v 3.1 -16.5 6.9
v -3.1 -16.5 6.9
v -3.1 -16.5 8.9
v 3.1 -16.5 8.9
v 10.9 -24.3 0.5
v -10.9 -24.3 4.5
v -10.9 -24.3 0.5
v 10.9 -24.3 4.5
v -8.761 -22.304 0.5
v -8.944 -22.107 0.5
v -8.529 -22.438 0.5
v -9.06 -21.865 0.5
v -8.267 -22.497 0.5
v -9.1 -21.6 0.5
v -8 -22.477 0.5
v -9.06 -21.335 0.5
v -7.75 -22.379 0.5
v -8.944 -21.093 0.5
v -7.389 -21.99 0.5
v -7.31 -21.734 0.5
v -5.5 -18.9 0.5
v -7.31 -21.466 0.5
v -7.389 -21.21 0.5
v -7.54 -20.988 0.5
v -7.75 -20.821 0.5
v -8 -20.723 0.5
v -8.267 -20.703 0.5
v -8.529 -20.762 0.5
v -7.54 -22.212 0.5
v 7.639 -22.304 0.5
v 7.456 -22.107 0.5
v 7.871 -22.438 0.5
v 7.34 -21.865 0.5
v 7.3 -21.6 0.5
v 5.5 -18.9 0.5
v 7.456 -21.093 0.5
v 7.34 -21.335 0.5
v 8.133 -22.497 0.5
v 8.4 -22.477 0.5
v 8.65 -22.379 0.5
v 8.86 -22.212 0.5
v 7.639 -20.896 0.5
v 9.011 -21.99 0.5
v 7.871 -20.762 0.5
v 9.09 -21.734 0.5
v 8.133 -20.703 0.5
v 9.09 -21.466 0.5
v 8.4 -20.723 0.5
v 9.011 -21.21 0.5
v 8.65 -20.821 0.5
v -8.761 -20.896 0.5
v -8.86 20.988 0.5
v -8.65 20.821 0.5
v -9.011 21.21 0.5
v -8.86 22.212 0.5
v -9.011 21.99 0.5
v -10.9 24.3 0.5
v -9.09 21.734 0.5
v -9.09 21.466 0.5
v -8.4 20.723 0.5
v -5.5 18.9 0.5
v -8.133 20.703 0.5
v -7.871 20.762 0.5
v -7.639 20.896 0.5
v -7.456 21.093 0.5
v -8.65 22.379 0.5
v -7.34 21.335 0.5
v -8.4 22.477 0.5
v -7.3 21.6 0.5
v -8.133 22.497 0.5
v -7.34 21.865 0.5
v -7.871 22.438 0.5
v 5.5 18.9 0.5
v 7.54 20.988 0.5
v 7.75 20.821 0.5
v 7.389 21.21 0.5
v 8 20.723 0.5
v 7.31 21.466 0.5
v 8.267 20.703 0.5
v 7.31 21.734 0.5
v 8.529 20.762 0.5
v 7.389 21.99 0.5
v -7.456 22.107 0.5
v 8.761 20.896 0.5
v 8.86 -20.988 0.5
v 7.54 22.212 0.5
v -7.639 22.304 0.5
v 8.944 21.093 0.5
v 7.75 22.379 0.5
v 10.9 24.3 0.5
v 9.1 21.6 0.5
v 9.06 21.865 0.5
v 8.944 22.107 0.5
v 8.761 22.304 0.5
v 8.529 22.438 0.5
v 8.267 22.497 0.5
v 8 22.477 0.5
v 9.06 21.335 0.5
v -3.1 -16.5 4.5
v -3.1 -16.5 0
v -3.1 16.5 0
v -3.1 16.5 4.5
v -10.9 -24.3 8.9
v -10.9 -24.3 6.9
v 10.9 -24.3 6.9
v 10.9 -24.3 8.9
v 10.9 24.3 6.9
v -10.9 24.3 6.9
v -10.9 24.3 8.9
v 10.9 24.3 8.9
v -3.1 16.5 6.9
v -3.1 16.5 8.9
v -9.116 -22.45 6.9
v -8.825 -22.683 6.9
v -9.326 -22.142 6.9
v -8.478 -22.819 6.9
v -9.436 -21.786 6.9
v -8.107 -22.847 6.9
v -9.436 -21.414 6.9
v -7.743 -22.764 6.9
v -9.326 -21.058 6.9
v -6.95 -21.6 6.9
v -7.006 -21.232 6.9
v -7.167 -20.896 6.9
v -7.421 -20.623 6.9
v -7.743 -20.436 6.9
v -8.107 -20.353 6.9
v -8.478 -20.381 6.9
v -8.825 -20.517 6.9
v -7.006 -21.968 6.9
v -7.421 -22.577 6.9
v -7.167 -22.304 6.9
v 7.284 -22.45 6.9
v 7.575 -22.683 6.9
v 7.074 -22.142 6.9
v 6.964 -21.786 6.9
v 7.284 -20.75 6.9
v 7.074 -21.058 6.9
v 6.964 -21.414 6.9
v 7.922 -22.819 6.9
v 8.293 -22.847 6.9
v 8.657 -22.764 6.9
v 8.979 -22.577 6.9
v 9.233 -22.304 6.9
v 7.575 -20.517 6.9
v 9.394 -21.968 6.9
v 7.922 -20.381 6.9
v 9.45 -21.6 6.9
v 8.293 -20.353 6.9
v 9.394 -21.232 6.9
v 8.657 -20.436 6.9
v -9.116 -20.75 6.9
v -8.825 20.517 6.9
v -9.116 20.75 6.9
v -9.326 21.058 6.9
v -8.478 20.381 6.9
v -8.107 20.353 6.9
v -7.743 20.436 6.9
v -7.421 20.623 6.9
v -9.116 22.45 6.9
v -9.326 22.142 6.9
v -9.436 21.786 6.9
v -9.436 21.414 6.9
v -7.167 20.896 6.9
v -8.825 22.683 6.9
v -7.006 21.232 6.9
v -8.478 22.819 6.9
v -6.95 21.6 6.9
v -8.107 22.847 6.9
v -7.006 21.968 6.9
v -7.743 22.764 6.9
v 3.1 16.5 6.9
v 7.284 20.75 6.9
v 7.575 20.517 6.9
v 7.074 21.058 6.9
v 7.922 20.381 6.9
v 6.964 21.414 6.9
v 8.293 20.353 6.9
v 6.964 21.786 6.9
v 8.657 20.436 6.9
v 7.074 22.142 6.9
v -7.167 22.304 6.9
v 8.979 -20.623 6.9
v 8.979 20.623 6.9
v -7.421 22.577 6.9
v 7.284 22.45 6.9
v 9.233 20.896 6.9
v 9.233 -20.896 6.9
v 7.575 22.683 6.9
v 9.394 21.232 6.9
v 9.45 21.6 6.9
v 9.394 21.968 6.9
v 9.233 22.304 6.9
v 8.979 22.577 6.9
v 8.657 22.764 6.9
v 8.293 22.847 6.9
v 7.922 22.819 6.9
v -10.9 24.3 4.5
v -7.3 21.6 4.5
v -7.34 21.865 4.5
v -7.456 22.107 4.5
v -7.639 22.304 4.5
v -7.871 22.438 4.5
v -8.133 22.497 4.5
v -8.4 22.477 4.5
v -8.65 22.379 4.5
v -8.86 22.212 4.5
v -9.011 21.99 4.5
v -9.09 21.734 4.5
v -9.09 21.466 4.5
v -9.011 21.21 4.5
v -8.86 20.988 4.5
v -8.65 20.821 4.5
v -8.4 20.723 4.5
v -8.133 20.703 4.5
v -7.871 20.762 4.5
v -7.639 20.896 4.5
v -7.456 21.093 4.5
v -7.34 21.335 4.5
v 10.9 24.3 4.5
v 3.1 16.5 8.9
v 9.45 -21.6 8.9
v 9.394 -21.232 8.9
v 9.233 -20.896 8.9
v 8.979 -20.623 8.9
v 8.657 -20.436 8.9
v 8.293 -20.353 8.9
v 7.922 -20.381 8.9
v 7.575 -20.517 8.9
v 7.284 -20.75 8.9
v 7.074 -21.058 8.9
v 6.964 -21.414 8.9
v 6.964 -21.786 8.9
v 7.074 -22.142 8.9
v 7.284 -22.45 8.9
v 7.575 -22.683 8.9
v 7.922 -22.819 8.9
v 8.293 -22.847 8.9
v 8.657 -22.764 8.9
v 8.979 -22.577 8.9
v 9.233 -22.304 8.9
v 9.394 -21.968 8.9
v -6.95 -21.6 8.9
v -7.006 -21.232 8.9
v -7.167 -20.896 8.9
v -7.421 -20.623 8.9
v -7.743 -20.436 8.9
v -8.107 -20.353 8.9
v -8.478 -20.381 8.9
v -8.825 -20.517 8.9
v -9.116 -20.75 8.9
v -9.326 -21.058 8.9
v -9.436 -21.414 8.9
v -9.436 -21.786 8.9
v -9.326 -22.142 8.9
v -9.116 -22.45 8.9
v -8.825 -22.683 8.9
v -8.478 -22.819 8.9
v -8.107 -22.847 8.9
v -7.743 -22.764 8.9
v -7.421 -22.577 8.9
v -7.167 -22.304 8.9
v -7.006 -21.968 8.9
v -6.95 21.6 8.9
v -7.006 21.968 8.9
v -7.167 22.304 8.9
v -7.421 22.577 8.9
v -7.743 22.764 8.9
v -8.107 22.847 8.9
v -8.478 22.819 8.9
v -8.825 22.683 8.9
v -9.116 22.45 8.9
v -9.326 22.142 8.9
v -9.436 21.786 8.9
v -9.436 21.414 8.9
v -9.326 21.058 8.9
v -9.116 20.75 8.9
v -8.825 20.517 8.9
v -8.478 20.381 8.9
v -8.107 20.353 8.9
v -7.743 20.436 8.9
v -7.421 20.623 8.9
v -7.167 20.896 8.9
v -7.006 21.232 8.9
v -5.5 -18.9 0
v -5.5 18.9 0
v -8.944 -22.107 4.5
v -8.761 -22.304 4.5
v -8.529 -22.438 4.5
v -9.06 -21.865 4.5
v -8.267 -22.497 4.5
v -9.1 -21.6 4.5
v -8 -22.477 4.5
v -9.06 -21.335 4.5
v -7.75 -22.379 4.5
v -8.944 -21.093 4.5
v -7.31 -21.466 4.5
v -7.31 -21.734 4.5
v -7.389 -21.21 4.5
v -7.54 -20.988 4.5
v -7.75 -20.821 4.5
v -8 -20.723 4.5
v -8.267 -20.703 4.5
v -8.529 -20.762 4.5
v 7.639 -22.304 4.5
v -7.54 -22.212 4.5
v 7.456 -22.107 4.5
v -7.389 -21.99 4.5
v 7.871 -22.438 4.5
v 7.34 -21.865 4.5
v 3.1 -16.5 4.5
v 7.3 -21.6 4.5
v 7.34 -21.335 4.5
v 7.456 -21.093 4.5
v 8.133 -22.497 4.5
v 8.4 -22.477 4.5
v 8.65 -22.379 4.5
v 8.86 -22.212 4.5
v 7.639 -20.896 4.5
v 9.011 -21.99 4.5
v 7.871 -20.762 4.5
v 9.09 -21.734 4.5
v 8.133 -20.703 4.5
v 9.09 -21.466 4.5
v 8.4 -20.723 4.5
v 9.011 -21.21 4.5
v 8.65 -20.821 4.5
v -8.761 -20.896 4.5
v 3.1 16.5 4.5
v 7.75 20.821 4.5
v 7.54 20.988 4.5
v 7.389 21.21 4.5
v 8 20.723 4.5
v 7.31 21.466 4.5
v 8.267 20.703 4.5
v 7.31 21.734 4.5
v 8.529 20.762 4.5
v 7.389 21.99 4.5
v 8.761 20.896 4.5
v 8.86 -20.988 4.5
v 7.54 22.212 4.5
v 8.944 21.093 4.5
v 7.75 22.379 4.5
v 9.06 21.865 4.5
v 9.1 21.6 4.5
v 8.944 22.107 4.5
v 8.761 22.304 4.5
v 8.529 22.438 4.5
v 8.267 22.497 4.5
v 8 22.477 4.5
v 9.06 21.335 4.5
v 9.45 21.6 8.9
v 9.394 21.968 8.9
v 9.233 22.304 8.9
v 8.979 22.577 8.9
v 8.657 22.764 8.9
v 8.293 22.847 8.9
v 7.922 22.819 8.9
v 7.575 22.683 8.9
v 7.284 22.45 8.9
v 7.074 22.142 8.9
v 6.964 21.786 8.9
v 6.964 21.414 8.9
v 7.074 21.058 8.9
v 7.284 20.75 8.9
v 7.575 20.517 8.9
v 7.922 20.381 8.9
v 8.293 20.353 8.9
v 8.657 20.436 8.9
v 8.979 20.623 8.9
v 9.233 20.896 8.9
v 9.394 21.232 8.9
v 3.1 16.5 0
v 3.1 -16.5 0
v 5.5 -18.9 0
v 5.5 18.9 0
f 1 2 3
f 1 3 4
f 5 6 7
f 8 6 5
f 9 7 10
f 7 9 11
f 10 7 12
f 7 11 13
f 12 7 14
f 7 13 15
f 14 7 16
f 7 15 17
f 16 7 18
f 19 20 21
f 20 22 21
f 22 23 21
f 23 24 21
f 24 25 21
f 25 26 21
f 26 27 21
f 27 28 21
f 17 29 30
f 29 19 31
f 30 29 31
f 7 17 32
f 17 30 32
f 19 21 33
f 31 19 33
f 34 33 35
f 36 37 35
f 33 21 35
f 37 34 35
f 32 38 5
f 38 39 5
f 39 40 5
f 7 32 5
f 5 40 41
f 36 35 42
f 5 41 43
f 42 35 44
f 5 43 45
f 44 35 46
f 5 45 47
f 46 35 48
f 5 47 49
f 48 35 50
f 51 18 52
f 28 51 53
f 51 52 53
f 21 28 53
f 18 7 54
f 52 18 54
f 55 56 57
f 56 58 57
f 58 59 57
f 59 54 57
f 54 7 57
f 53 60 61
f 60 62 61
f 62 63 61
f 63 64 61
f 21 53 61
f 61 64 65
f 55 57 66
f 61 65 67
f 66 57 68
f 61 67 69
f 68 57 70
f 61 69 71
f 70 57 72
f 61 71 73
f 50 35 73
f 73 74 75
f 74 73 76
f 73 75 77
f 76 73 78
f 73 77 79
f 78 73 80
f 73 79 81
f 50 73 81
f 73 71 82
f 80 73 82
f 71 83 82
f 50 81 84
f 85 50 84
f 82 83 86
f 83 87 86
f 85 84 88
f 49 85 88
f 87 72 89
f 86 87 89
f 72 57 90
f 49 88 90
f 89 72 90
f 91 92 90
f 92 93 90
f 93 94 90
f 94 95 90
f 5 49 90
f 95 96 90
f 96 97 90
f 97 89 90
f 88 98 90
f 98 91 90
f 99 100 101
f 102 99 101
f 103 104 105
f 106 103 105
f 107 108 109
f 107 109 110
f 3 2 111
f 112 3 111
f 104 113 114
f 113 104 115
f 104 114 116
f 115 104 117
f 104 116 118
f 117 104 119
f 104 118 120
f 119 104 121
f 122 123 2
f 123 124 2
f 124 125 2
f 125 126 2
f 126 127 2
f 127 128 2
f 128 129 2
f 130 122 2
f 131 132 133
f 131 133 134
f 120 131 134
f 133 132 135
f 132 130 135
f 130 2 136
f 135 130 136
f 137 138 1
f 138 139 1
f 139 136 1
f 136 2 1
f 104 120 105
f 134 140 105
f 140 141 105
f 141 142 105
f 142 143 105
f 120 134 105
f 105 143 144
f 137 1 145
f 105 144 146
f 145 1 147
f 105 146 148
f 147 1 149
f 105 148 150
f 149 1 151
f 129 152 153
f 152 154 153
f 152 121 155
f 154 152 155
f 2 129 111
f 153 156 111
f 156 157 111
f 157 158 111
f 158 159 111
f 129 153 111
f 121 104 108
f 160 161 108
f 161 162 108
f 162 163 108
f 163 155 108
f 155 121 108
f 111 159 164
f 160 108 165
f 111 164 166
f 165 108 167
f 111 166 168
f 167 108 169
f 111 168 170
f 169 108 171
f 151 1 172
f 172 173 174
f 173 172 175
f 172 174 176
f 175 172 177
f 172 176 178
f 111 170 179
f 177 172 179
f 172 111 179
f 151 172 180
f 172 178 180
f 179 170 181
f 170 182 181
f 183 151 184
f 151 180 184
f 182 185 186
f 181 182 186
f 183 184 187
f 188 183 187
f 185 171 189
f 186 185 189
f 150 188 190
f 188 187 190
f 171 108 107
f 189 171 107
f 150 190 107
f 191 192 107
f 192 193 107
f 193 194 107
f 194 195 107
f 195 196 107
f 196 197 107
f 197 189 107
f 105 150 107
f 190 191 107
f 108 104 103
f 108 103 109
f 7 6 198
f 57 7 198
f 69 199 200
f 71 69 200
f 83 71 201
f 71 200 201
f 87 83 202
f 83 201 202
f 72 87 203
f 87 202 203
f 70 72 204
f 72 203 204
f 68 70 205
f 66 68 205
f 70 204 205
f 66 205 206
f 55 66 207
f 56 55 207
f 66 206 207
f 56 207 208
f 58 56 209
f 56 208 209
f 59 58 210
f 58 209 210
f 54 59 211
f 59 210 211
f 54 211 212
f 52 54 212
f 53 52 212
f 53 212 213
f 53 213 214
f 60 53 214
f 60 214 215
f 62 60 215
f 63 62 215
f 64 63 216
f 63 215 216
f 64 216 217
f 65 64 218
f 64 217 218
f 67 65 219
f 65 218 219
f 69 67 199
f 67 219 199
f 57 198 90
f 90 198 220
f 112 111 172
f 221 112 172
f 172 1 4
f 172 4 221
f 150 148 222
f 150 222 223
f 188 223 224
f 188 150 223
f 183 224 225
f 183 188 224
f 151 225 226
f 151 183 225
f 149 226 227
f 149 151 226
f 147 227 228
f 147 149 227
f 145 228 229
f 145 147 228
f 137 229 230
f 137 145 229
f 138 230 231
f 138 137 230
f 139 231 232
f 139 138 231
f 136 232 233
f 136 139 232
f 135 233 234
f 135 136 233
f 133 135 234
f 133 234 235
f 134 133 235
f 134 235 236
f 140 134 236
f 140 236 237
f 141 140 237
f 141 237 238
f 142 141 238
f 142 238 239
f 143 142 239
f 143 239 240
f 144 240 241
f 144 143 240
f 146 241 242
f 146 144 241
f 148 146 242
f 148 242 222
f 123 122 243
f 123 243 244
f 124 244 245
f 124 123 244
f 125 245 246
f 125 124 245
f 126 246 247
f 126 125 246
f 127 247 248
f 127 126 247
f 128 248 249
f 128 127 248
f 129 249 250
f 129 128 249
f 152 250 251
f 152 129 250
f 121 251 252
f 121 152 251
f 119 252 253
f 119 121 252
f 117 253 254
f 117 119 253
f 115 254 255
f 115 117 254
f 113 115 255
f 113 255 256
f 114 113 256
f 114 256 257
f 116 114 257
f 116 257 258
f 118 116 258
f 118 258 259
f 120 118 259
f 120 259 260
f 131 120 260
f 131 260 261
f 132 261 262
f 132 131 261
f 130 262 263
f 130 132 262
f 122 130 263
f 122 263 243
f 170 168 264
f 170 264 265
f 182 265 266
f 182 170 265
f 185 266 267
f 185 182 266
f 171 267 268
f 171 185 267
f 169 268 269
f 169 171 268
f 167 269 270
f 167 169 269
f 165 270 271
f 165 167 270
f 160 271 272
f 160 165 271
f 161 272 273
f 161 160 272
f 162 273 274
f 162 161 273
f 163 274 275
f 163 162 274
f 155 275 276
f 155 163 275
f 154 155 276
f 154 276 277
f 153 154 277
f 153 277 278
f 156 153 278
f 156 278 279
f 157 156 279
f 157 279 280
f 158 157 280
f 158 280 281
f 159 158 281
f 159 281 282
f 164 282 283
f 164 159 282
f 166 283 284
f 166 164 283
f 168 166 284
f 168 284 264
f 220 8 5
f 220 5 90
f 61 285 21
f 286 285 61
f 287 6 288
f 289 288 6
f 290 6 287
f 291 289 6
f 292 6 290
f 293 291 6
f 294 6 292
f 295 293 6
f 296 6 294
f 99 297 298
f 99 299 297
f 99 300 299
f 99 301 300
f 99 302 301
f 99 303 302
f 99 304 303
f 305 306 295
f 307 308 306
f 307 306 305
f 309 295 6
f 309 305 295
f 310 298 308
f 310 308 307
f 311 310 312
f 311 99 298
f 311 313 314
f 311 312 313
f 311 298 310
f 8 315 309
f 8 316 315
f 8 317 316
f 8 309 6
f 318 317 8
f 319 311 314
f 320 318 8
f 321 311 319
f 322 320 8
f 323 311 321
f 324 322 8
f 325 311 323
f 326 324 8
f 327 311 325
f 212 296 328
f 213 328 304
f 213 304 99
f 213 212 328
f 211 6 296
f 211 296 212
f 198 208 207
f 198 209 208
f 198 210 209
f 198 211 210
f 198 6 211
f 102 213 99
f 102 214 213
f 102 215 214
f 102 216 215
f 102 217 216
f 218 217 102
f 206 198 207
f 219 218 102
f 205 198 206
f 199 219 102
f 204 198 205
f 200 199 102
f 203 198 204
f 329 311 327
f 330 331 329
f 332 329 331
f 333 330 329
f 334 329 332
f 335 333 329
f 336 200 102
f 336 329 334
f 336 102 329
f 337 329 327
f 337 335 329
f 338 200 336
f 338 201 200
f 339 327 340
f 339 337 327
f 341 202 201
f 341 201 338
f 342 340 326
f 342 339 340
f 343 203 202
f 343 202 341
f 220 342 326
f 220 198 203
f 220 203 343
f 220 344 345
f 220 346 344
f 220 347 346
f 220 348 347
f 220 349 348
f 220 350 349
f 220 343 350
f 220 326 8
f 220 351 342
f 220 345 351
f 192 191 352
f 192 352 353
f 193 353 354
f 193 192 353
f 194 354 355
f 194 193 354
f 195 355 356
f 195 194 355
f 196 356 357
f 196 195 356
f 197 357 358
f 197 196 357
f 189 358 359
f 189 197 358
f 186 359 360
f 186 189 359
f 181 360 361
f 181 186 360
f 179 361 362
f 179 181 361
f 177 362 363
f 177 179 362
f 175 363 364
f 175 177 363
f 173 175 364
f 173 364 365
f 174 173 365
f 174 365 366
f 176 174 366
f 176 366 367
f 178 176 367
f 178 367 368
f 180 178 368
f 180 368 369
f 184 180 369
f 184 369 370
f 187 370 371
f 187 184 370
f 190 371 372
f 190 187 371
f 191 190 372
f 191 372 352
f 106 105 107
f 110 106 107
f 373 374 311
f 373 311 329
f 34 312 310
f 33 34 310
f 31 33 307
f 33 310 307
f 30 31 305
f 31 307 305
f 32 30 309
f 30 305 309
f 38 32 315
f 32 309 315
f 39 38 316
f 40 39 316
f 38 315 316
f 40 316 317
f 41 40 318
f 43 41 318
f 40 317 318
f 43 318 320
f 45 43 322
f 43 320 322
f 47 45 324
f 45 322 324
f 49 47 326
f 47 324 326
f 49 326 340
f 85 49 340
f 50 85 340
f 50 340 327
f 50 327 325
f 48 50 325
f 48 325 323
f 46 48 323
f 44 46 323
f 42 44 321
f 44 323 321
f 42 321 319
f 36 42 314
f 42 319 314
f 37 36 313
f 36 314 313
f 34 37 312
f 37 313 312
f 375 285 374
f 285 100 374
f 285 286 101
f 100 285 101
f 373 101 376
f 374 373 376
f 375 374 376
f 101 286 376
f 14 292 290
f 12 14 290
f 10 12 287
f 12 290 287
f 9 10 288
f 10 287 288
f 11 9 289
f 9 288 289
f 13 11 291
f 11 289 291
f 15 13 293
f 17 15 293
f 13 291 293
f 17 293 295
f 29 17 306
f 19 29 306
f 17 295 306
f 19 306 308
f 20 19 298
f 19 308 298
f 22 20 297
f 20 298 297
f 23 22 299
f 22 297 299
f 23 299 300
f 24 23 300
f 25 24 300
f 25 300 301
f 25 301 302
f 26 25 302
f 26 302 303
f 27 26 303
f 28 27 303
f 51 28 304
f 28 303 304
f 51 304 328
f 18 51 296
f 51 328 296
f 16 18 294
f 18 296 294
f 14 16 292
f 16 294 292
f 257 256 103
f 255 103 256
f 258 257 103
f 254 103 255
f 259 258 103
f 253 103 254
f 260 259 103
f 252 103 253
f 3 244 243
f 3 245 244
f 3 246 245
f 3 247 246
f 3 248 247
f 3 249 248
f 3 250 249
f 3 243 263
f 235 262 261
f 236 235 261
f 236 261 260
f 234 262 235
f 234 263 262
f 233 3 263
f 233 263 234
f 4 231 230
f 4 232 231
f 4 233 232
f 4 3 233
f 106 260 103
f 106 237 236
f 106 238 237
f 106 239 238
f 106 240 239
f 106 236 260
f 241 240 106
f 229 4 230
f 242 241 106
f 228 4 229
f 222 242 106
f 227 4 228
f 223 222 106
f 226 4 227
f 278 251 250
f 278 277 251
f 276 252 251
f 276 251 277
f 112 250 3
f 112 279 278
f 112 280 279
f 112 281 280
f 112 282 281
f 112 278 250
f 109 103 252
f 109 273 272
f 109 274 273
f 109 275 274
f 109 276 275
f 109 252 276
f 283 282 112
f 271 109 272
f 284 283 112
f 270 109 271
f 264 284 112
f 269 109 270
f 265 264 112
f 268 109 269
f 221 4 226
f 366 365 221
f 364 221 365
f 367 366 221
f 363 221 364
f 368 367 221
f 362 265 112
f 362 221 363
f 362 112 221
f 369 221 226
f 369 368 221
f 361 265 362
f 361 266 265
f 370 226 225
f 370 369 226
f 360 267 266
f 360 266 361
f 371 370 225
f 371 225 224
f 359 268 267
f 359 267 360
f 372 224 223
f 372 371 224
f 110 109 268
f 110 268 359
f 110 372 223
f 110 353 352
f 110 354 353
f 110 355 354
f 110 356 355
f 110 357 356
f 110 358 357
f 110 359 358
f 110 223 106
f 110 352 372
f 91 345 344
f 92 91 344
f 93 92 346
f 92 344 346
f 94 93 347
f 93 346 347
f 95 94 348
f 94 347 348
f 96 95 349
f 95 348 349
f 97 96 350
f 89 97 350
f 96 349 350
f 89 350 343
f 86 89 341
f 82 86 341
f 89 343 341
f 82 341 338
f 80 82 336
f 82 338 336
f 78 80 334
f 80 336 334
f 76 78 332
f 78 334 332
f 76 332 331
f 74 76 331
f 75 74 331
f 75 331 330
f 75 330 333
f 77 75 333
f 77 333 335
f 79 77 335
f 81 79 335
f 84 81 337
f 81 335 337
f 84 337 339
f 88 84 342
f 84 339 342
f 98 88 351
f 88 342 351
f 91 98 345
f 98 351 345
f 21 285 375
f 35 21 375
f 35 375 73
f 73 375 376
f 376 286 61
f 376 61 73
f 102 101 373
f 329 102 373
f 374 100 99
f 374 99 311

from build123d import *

# Parameters (mm, degrees)
SKETCH1_W           = 6.2
SKETCH1_H           = 33
BOSS_EXTRUDE1_DEPTH = 4.5
SHELL1_T            = 2.4
SKETCH2_W           = 21.8
SKETCH2_H           = 48.6
SKETCH2_R           = 0.9
SKETCH2_W_2         = 11
SKETCH2_H_2         = 37.8
BOSS_EXTRUDE2_DEPTH = 4
BOSS_EXTRUDE3_START = 2.4
SKETCH3_W           = 21.8
SKETCH3_H           = 48.6
SKETCH3_R           = 1.25
SKETCH3_W_2         = 6.2
SKETCH3_H_2         = 33
BOSS_EXTRUDE3_DEPTH = 2


with BuildPart() as part:
    # Sketch1 → Boss-Extrude1 (new body)
    with BuildSketch(Plane.XY):
        Rectangle(SKETCH1_W, SKETCH1_H)
    extrude(amount=BOSS_EXTRUDE1_DEPTH)

    # Shell1
    shell1_openings = [part.faces().sort_by_distance(p)[0] for p in [
        (0, 0, 0),
        (0, 0, 4.5),
    ]]
    offset(amount=SHELL1_T, openings=shell1_openings, kind=Kind.INTERSECTION)

    # Sketch2 → Boss-Extrude2 (add)
    with BuildSketch(Plane.XY.offset(4.5)):
        Rectangle(SKETCH2_W, SKETCH2_H)
        with Locations((-8.2, 21.6)):
            Circle(SKETCH2_R, mode=Mode.SUBTRACT)
        with Locations((8.2, 21.6)):
            Circle(SKETCH2_R, mode=Mode.SUBTRACT)
        with Locations(Location((8.2, -21.6, 0), (0, 0, 180))):
            Circle(SKETCH2_R, mode=Mode.SUBTRACT)
        with Locations(Location((-8.2, -21.6, 0), (0, 0, 180))):
            Circle(SKETCH2_R, mode=Mode.SUBTRACT)
        Rectangle(SKETCH2_W_2, SKETCH2_H_2, mode=Mode.SUBTRACT)
    extrude(amount=-BOSS_EXTRUDE2_DEPTH)


with BuildPart() as body_2:
    # Sketch3 → Boss-Extrude3 (new body)
    with BuildSketch(Plane.XY.offset(4.5).offset(BOSS_EXTRUDE3_START)):
        Rectangle(SKETCH3_W, SKETCH3_H)
        with Locations((-8.2, 21.6)):
            Circle(SKETCH3_R, mode=Mode.SUBTRACT)
        with Locations((8.2, 21.6)):
            Circle(SKETCH3_R, mode=Mode.SUBTRACT)
        with Locations((-8.2, -21.6)):
            Circle(SKETCH3_R, mode=Mode.SUBTRACT)
        with Locations((8.2, -21.6)):
            Circle(SKETCH3_R, mode=Mode.SUBTRACT)
        Rectangle(SKETCH3_W_2, SKETCH3_H_2, mode=Mode.SUBTRACT)
    extrude(amount=BOSS_EXTRUDE3_DEPTH)


solid = Compound([part.part, body_2.part])
